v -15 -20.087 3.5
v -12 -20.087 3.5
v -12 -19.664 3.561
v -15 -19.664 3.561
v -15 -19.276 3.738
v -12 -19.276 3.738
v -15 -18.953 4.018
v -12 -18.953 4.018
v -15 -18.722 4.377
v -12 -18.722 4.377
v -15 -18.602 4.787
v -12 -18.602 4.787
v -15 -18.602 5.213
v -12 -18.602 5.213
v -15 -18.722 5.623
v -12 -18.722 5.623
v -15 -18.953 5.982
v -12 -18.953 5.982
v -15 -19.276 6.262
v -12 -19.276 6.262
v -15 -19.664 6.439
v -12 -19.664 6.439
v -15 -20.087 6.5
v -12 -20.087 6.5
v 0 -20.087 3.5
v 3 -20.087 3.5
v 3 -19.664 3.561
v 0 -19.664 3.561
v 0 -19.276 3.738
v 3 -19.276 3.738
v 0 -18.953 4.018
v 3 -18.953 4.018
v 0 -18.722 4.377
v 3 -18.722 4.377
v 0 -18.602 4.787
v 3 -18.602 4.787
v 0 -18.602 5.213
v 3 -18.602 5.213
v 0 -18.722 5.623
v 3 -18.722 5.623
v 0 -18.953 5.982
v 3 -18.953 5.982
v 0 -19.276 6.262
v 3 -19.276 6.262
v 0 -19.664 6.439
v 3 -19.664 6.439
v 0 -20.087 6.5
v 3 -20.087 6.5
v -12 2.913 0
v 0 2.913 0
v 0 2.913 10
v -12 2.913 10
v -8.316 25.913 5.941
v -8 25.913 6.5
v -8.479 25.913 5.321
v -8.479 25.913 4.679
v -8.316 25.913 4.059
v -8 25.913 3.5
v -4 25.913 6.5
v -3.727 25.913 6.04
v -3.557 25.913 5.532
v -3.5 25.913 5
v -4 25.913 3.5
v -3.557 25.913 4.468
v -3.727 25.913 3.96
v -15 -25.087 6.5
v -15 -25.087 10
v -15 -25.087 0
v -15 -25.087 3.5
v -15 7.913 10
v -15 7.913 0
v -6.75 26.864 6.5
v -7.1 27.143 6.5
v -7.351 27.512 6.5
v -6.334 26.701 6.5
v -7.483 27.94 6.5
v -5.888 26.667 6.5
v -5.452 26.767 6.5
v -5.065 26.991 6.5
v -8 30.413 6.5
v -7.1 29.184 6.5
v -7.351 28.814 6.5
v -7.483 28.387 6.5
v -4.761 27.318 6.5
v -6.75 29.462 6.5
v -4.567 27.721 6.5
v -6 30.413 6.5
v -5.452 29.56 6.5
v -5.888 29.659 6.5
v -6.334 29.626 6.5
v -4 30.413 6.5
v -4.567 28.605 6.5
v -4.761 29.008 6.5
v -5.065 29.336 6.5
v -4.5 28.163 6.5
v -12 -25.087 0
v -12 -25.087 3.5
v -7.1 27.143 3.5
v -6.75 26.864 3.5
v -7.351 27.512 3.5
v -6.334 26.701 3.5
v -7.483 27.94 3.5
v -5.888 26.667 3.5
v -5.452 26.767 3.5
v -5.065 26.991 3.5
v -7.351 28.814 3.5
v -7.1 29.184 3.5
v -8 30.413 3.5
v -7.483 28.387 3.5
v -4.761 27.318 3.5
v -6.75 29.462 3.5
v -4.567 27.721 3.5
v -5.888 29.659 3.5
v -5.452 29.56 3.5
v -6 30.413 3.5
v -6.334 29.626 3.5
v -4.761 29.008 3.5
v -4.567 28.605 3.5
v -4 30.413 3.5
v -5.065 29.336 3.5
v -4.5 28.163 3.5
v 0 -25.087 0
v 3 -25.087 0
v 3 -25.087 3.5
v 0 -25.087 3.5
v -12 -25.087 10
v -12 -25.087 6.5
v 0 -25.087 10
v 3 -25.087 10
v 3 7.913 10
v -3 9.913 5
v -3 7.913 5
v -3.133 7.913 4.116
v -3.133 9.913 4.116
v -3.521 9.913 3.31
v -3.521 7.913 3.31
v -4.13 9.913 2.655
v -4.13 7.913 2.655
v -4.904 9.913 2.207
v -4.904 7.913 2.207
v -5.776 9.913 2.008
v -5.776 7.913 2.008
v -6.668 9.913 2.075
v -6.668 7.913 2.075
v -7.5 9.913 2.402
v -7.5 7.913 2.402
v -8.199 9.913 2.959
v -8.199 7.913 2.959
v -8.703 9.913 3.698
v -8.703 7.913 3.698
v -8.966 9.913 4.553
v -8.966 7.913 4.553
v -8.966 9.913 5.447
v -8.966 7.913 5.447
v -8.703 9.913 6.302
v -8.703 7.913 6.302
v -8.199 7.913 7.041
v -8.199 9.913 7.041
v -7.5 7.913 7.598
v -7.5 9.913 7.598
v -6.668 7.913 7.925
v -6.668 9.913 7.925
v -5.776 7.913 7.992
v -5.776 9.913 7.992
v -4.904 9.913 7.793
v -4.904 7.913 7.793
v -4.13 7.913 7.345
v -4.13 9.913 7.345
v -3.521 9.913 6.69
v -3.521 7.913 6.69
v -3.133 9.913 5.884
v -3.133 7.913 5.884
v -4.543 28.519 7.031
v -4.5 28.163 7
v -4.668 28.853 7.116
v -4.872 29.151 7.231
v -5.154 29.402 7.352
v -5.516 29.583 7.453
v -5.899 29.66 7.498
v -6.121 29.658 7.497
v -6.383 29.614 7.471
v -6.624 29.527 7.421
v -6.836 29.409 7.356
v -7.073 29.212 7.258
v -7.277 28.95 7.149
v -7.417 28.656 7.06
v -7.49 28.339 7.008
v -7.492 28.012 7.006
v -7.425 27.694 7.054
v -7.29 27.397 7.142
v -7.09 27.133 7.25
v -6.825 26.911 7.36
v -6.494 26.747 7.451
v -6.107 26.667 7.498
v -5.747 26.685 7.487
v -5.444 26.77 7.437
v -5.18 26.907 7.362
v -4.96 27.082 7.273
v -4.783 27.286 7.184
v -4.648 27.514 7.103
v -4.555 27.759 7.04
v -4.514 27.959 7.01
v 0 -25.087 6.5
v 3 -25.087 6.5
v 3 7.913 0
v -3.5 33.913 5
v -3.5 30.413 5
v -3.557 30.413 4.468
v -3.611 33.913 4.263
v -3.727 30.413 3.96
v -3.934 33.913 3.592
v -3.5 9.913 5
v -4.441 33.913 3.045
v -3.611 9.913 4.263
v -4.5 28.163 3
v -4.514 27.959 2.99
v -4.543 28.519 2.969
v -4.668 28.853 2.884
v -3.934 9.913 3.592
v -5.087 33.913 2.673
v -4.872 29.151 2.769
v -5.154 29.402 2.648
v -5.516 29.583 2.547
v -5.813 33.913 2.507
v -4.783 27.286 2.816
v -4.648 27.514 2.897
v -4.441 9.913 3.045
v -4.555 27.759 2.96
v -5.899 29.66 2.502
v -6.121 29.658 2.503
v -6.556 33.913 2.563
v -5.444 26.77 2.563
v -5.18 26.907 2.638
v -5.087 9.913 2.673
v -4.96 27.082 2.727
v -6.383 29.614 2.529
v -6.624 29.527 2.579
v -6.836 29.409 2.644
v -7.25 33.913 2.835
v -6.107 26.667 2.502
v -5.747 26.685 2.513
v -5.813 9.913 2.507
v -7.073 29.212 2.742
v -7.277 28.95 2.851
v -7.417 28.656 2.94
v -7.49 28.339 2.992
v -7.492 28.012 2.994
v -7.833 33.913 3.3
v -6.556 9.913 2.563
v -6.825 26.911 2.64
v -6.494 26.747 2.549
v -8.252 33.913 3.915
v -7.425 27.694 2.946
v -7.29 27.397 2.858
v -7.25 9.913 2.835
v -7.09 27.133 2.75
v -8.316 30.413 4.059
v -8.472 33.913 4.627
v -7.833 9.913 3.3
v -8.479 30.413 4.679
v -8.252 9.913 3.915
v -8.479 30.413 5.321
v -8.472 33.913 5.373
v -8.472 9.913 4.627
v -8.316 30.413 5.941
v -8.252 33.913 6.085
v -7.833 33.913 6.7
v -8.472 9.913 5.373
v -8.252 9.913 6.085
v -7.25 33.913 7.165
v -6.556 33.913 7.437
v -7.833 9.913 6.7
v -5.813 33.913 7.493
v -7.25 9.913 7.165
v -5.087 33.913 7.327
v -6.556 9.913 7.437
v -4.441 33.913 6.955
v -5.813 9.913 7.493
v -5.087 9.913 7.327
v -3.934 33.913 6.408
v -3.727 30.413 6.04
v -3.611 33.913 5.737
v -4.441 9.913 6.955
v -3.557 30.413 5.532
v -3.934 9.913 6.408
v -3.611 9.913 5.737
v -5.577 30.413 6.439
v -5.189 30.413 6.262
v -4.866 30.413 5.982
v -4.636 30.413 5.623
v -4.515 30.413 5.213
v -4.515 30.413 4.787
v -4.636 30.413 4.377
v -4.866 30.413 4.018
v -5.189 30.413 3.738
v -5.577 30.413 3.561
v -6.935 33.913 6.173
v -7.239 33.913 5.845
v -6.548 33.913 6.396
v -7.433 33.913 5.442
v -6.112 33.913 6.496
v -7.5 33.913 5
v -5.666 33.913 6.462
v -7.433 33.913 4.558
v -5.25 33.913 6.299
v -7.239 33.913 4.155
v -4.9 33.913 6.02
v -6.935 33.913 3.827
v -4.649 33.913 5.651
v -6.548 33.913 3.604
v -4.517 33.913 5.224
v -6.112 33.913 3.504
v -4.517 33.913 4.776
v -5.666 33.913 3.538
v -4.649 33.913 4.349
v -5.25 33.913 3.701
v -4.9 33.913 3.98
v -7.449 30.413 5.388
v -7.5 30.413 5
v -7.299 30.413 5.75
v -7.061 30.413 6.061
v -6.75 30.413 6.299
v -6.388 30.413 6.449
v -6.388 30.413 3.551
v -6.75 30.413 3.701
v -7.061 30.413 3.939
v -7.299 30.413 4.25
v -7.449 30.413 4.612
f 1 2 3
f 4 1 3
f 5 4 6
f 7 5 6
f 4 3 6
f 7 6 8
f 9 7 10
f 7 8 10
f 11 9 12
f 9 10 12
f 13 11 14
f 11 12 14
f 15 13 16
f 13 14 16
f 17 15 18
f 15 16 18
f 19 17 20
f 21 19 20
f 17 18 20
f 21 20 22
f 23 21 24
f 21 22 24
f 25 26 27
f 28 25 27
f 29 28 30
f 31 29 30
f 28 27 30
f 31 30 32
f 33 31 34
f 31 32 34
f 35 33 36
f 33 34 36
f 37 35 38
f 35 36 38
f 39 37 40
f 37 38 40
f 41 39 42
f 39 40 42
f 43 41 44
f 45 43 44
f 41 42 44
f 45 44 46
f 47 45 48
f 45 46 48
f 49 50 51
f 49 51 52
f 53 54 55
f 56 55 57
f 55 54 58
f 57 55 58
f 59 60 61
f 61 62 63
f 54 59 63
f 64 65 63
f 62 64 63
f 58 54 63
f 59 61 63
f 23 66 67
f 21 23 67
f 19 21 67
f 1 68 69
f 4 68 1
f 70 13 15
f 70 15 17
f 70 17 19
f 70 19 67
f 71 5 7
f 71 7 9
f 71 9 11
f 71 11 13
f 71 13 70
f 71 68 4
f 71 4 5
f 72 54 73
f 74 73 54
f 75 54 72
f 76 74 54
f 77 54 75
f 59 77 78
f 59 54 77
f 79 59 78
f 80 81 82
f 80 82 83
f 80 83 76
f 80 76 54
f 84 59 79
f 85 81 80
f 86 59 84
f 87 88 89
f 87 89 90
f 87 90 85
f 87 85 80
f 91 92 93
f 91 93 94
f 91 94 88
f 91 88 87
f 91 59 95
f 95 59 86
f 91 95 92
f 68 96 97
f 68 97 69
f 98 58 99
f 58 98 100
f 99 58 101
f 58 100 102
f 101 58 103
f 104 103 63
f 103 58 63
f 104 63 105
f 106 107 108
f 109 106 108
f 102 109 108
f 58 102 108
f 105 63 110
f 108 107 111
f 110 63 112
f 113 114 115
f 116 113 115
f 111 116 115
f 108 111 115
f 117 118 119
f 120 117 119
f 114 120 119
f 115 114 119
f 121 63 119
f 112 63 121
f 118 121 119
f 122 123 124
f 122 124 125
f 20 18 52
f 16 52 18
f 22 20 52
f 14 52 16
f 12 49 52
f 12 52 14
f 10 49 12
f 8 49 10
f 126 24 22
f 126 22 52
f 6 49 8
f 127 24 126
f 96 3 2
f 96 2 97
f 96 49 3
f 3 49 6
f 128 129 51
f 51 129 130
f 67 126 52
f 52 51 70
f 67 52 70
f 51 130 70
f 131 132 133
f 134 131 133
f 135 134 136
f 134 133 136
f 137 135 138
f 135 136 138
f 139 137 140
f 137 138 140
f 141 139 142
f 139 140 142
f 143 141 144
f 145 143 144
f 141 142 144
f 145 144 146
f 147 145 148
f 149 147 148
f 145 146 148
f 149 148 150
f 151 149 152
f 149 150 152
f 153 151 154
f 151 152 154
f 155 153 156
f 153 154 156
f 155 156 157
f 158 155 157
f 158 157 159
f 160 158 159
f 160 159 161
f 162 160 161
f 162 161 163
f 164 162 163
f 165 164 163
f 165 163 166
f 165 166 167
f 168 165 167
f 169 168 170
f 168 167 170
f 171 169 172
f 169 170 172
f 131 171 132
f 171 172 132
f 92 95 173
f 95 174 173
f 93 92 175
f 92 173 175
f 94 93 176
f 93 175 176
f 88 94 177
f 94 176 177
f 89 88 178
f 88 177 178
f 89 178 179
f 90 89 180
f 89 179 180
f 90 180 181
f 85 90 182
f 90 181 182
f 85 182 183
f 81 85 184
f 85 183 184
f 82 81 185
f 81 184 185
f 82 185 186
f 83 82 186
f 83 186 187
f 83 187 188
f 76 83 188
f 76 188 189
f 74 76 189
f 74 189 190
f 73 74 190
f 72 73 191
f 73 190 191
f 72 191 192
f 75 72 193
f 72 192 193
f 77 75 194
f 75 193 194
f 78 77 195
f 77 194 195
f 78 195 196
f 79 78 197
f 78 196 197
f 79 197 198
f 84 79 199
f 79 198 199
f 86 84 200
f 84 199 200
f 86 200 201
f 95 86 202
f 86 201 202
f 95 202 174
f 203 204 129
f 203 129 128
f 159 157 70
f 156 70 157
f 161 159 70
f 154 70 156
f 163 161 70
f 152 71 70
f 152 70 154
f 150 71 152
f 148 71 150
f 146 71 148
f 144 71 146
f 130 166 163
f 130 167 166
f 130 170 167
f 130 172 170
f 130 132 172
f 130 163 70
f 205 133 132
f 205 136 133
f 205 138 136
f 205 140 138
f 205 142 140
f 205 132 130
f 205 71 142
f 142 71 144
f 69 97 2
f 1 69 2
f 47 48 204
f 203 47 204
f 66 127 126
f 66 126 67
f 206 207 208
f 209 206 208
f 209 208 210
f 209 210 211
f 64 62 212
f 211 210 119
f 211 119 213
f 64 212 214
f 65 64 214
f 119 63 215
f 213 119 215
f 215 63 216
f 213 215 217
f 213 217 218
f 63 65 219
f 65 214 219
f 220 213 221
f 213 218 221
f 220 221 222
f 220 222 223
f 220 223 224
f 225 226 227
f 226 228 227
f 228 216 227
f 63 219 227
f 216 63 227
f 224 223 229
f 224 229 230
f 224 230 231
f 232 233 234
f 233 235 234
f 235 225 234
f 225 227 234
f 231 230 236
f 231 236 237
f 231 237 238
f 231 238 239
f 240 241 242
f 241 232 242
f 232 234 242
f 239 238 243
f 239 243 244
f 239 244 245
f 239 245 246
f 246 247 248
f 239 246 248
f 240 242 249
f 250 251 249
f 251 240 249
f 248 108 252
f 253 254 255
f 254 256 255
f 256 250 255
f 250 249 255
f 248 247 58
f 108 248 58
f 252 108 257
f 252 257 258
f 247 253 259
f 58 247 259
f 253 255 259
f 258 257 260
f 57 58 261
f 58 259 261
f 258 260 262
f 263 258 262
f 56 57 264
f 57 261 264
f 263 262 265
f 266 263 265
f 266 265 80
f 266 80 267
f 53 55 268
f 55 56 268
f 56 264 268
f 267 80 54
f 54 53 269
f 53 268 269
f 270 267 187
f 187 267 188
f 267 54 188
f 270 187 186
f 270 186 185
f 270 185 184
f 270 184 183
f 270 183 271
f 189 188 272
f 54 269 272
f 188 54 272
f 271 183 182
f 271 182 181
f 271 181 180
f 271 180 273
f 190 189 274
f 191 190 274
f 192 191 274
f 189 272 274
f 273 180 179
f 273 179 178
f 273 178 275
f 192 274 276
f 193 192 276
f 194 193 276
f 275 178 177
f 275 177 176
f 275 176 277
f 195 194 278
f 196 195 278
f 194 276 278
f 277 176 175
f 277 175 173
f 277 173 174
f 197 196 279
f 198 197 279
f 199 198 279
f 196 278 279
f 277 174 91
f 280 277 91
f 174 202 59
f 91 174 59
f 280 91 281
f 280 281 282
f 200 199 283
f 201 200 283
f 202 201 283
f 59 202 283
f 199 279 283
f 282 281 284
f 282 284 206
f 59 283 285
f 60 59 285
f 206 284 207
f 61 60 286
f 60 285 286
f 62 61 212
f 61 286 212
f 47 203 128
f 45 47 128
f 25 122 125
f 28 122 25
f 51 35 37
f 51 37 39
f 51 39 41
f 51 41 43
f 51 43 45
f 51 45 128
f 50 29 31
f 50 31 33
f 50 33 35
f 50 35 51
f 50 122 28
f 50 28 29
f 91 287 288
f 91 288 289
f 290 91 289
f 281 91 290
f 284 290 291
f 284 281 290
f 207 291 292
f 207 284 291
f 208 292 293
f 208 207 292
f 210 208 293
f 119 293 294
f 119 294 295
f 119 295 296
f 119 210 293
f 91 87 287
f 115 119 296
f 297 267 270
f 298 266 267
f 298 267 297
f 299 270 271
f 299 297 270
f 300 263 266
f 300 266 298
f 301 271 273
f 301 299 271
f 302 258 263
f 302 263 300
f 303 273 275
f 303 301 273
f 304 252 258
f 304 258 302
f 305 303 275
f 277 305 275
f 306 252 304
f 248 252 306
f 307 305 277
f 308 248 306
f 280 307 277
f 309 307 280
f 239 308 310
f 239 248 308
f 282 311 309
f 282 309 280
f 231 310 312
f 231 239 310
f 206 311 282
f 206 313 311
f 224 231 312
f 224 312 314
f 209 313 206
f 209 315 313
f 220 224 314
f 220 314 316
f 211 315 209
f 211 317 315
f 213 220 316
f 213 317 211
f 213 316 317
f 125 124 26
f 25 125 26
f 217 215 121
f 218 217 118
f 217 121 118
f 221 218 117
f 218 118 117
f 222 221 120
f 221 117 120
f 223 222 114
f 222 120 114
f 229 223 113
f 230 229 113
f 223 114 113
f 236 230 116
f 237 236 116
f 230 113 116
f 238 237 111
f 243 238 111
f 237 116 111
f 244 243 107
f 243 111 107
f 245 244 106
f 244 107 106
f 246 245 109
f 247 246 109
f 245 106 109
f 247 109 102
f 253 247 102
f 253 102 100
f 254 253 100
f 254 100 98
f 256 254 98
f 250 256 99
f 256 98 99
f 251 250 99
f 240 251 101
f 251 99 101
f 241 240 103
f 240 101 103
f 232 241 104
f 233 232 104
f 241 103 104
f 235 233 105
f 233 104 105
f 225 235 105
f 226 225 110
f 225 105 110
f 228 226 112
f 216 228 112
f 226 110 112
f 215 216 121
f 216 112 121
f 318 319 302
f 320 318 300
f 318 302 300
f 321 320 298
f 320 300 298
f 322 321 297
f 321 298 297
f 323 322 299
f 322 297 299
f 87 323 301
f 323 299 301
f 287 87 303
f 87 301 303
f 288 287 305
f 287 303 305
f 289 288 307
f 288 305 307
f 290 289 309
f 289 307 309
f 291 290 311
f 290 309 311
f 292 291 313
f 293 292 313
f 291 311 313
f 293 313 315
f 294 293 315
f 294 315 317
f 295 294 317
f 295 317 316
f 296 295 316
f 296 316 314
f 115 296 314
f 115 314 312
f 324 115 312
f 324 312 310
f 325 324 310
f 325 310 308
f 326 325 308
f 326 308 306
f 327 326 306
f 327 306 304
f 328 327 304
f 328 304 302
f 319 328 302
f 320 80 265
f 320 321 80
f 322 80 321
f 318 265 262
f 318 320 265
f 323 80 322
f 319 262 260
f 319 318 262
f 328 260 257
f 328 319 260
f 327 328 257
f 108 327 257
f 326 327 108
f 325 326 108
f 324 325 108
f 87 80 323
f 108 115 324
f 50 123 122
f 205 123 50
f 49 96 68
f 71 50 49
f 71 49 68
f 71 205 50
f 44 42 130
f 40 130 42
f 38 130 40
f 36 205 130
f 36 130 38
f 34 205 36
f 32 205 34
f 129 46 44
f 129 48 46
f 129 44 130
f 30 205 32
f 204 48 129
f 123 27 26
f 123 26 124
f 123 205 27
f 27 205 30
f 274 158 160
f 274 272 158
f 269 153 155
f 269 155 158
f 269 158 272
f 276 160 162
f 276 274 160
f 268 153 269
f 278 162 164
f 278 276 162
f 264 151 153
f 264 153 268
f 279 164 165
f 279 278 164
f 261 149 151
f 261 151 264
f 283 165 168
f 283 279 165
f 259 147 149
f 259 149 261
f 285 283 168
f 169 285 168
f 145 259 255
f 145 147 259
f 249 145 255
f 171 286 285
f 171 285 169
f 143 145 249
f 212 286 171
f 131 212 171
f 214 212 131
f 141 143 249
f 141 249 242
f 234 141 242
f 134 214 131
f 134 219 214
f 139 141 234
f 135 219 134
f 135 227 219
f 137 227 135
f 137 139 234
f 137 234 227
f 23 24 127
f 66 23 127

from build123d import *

# Parameters (mm, degrees)
EXTRUDE_1_DEPTH          = 10
CUT_EXTRUDE_1_DEPTH      = 19
SKETCH_9_R               = 3
EXTRUDE_2_DEPTH          = 2
SKETCH_11_R              = 2.5
EXTRUDE_4_DEPTH          = 24
SKETCH_12_W              = 3
SKETCH_12_H              = 4.5
CUT_EXTRUDE_2_DEPTH      = 4
CUT_EXTRUDE_2_DEPTH_BACK = 16
CUT_EXTRUDE_3_REACH      = 61
SKETCH_13_R              = 1.5
SKETCH_15_R              = 1.5
CUT_EXTRUDE_4_DEPTH      = 5


with BuildPart() as part:
    # 草图1 → 凸台-拉伸1 (new body)
    with BuildSketch(Plane.XY):
        Polygon((-15, -25.086741331), (-15, 7.913258669), (3, 7.913258669), (3, -25.086741331), (0, -25.086741331), (0, 2.913258669), (-12, 2.913258669), (-12, -25.086741331), align=None)
    extrude(amount=EXTRUDE_1_DEPTH)

    # 草图2 → 切除-拉伸1 (cut, through all)
    with BuildSketch(Plane(origin=(3, 0, 0), x_dir=(0, 0, -1), z_dir=(1, 0, 0))):
        with BuildLine():
            Line((-6.5, -20.086741331), (-6.5, -25.086741331))
            Line((-6.5, -25.086741331), (-3.5, -25.086741331))
            Line((-3.5, -25.086741331), (-3.5, -20.086741331))
            ThreePointArc((-3.5, -20.086741331), (-5, -18.586741331), (-6.5, -20.086741331))
        make_face()
    extrude(amount=-CUT_EXTRUDE_1_DEPTH, mode=Mode.SUBTRACT)

    # 草图9 → 凸台-拉伸2 (add)
    with BuildSketch(Plane(origin=(0, 7.913258669, 0), x_dir=(1, 0, 0), z_dir=(0, 1, 0))):
        with Locations((-6, -5)):
            Circle(SKETCH_9_R)
    extrude(amount=EXTRUDE_2_DEPTH)

    # 草图11 → 凸台-拉伸4 (add)
    with BuildSketch(Plane(origin=(0, 9.913258669, 0), x_dir=(1, 0, 0), z_dir=(0, 1, 0))):
        with Locations((-6, -5)):
            Circle(SKETCH_11_R)
    extrude(amount=EXTRUDE_4_DEPTH)

    # 草图12 → 切除-拉伸2 (cut, two sides)
    with BuildSketch(Plane(origin=(0, 0, 0), x_dir=(0, 0, -1), z_dir=(1, 0, 0))) as cut_extrude_2_sk:
        with Locations((-5, 28.163258669)):
            Rectangle(SKETCH_12_W, SKETCH_12_H)
    extrude(amount=CUT_EXTRUDE_2_DEPTH, mode=Mode.SUBTRACT)
    extrude(cut_extrude_2_sk.sketch, amount=-CUT_EXTRUDE_2_DEPTH_BACK, mode=Mode.SUBTRACT)

    # 草图13 → 切除-拉伸3 (cut, up to next)
    with BuildSketch(Plane(origin=(0, 33.913258669, 0), x_dir=(-1, 0, 0), z_dir=(0, 1, 0)), mode=Mode.PRIVATE) as cut_extrude_3_sk1:
        with Locations((6, 5)):
            Circle(SKETCH_13_R)
    cut_extrude_3_tool1 = extrude(cut_extrude_3_sk1.sketch, amount=-CUT_EXTRUDE_3_REACH, mode=Mode.PRIVATE) & part.part
    add(cut_extrude_3_tool1.solids().sort_by_distance((-6, 33.913259, 5))[0], mode=Mode.SUBTRACT)

    # 草图15 → 切除-拉伸4 (cut, symmetric)
    with BuildSketch(Plane.XY.offset(5)):
        with Locations((-6, 28.163258669)):
            Circle(SKETCH_15_R)
    extrude(amount=CUT_EXTRUDE_4_DEPTH, both=True, mode=Mode.SUBTRACT)


solid = part.part
